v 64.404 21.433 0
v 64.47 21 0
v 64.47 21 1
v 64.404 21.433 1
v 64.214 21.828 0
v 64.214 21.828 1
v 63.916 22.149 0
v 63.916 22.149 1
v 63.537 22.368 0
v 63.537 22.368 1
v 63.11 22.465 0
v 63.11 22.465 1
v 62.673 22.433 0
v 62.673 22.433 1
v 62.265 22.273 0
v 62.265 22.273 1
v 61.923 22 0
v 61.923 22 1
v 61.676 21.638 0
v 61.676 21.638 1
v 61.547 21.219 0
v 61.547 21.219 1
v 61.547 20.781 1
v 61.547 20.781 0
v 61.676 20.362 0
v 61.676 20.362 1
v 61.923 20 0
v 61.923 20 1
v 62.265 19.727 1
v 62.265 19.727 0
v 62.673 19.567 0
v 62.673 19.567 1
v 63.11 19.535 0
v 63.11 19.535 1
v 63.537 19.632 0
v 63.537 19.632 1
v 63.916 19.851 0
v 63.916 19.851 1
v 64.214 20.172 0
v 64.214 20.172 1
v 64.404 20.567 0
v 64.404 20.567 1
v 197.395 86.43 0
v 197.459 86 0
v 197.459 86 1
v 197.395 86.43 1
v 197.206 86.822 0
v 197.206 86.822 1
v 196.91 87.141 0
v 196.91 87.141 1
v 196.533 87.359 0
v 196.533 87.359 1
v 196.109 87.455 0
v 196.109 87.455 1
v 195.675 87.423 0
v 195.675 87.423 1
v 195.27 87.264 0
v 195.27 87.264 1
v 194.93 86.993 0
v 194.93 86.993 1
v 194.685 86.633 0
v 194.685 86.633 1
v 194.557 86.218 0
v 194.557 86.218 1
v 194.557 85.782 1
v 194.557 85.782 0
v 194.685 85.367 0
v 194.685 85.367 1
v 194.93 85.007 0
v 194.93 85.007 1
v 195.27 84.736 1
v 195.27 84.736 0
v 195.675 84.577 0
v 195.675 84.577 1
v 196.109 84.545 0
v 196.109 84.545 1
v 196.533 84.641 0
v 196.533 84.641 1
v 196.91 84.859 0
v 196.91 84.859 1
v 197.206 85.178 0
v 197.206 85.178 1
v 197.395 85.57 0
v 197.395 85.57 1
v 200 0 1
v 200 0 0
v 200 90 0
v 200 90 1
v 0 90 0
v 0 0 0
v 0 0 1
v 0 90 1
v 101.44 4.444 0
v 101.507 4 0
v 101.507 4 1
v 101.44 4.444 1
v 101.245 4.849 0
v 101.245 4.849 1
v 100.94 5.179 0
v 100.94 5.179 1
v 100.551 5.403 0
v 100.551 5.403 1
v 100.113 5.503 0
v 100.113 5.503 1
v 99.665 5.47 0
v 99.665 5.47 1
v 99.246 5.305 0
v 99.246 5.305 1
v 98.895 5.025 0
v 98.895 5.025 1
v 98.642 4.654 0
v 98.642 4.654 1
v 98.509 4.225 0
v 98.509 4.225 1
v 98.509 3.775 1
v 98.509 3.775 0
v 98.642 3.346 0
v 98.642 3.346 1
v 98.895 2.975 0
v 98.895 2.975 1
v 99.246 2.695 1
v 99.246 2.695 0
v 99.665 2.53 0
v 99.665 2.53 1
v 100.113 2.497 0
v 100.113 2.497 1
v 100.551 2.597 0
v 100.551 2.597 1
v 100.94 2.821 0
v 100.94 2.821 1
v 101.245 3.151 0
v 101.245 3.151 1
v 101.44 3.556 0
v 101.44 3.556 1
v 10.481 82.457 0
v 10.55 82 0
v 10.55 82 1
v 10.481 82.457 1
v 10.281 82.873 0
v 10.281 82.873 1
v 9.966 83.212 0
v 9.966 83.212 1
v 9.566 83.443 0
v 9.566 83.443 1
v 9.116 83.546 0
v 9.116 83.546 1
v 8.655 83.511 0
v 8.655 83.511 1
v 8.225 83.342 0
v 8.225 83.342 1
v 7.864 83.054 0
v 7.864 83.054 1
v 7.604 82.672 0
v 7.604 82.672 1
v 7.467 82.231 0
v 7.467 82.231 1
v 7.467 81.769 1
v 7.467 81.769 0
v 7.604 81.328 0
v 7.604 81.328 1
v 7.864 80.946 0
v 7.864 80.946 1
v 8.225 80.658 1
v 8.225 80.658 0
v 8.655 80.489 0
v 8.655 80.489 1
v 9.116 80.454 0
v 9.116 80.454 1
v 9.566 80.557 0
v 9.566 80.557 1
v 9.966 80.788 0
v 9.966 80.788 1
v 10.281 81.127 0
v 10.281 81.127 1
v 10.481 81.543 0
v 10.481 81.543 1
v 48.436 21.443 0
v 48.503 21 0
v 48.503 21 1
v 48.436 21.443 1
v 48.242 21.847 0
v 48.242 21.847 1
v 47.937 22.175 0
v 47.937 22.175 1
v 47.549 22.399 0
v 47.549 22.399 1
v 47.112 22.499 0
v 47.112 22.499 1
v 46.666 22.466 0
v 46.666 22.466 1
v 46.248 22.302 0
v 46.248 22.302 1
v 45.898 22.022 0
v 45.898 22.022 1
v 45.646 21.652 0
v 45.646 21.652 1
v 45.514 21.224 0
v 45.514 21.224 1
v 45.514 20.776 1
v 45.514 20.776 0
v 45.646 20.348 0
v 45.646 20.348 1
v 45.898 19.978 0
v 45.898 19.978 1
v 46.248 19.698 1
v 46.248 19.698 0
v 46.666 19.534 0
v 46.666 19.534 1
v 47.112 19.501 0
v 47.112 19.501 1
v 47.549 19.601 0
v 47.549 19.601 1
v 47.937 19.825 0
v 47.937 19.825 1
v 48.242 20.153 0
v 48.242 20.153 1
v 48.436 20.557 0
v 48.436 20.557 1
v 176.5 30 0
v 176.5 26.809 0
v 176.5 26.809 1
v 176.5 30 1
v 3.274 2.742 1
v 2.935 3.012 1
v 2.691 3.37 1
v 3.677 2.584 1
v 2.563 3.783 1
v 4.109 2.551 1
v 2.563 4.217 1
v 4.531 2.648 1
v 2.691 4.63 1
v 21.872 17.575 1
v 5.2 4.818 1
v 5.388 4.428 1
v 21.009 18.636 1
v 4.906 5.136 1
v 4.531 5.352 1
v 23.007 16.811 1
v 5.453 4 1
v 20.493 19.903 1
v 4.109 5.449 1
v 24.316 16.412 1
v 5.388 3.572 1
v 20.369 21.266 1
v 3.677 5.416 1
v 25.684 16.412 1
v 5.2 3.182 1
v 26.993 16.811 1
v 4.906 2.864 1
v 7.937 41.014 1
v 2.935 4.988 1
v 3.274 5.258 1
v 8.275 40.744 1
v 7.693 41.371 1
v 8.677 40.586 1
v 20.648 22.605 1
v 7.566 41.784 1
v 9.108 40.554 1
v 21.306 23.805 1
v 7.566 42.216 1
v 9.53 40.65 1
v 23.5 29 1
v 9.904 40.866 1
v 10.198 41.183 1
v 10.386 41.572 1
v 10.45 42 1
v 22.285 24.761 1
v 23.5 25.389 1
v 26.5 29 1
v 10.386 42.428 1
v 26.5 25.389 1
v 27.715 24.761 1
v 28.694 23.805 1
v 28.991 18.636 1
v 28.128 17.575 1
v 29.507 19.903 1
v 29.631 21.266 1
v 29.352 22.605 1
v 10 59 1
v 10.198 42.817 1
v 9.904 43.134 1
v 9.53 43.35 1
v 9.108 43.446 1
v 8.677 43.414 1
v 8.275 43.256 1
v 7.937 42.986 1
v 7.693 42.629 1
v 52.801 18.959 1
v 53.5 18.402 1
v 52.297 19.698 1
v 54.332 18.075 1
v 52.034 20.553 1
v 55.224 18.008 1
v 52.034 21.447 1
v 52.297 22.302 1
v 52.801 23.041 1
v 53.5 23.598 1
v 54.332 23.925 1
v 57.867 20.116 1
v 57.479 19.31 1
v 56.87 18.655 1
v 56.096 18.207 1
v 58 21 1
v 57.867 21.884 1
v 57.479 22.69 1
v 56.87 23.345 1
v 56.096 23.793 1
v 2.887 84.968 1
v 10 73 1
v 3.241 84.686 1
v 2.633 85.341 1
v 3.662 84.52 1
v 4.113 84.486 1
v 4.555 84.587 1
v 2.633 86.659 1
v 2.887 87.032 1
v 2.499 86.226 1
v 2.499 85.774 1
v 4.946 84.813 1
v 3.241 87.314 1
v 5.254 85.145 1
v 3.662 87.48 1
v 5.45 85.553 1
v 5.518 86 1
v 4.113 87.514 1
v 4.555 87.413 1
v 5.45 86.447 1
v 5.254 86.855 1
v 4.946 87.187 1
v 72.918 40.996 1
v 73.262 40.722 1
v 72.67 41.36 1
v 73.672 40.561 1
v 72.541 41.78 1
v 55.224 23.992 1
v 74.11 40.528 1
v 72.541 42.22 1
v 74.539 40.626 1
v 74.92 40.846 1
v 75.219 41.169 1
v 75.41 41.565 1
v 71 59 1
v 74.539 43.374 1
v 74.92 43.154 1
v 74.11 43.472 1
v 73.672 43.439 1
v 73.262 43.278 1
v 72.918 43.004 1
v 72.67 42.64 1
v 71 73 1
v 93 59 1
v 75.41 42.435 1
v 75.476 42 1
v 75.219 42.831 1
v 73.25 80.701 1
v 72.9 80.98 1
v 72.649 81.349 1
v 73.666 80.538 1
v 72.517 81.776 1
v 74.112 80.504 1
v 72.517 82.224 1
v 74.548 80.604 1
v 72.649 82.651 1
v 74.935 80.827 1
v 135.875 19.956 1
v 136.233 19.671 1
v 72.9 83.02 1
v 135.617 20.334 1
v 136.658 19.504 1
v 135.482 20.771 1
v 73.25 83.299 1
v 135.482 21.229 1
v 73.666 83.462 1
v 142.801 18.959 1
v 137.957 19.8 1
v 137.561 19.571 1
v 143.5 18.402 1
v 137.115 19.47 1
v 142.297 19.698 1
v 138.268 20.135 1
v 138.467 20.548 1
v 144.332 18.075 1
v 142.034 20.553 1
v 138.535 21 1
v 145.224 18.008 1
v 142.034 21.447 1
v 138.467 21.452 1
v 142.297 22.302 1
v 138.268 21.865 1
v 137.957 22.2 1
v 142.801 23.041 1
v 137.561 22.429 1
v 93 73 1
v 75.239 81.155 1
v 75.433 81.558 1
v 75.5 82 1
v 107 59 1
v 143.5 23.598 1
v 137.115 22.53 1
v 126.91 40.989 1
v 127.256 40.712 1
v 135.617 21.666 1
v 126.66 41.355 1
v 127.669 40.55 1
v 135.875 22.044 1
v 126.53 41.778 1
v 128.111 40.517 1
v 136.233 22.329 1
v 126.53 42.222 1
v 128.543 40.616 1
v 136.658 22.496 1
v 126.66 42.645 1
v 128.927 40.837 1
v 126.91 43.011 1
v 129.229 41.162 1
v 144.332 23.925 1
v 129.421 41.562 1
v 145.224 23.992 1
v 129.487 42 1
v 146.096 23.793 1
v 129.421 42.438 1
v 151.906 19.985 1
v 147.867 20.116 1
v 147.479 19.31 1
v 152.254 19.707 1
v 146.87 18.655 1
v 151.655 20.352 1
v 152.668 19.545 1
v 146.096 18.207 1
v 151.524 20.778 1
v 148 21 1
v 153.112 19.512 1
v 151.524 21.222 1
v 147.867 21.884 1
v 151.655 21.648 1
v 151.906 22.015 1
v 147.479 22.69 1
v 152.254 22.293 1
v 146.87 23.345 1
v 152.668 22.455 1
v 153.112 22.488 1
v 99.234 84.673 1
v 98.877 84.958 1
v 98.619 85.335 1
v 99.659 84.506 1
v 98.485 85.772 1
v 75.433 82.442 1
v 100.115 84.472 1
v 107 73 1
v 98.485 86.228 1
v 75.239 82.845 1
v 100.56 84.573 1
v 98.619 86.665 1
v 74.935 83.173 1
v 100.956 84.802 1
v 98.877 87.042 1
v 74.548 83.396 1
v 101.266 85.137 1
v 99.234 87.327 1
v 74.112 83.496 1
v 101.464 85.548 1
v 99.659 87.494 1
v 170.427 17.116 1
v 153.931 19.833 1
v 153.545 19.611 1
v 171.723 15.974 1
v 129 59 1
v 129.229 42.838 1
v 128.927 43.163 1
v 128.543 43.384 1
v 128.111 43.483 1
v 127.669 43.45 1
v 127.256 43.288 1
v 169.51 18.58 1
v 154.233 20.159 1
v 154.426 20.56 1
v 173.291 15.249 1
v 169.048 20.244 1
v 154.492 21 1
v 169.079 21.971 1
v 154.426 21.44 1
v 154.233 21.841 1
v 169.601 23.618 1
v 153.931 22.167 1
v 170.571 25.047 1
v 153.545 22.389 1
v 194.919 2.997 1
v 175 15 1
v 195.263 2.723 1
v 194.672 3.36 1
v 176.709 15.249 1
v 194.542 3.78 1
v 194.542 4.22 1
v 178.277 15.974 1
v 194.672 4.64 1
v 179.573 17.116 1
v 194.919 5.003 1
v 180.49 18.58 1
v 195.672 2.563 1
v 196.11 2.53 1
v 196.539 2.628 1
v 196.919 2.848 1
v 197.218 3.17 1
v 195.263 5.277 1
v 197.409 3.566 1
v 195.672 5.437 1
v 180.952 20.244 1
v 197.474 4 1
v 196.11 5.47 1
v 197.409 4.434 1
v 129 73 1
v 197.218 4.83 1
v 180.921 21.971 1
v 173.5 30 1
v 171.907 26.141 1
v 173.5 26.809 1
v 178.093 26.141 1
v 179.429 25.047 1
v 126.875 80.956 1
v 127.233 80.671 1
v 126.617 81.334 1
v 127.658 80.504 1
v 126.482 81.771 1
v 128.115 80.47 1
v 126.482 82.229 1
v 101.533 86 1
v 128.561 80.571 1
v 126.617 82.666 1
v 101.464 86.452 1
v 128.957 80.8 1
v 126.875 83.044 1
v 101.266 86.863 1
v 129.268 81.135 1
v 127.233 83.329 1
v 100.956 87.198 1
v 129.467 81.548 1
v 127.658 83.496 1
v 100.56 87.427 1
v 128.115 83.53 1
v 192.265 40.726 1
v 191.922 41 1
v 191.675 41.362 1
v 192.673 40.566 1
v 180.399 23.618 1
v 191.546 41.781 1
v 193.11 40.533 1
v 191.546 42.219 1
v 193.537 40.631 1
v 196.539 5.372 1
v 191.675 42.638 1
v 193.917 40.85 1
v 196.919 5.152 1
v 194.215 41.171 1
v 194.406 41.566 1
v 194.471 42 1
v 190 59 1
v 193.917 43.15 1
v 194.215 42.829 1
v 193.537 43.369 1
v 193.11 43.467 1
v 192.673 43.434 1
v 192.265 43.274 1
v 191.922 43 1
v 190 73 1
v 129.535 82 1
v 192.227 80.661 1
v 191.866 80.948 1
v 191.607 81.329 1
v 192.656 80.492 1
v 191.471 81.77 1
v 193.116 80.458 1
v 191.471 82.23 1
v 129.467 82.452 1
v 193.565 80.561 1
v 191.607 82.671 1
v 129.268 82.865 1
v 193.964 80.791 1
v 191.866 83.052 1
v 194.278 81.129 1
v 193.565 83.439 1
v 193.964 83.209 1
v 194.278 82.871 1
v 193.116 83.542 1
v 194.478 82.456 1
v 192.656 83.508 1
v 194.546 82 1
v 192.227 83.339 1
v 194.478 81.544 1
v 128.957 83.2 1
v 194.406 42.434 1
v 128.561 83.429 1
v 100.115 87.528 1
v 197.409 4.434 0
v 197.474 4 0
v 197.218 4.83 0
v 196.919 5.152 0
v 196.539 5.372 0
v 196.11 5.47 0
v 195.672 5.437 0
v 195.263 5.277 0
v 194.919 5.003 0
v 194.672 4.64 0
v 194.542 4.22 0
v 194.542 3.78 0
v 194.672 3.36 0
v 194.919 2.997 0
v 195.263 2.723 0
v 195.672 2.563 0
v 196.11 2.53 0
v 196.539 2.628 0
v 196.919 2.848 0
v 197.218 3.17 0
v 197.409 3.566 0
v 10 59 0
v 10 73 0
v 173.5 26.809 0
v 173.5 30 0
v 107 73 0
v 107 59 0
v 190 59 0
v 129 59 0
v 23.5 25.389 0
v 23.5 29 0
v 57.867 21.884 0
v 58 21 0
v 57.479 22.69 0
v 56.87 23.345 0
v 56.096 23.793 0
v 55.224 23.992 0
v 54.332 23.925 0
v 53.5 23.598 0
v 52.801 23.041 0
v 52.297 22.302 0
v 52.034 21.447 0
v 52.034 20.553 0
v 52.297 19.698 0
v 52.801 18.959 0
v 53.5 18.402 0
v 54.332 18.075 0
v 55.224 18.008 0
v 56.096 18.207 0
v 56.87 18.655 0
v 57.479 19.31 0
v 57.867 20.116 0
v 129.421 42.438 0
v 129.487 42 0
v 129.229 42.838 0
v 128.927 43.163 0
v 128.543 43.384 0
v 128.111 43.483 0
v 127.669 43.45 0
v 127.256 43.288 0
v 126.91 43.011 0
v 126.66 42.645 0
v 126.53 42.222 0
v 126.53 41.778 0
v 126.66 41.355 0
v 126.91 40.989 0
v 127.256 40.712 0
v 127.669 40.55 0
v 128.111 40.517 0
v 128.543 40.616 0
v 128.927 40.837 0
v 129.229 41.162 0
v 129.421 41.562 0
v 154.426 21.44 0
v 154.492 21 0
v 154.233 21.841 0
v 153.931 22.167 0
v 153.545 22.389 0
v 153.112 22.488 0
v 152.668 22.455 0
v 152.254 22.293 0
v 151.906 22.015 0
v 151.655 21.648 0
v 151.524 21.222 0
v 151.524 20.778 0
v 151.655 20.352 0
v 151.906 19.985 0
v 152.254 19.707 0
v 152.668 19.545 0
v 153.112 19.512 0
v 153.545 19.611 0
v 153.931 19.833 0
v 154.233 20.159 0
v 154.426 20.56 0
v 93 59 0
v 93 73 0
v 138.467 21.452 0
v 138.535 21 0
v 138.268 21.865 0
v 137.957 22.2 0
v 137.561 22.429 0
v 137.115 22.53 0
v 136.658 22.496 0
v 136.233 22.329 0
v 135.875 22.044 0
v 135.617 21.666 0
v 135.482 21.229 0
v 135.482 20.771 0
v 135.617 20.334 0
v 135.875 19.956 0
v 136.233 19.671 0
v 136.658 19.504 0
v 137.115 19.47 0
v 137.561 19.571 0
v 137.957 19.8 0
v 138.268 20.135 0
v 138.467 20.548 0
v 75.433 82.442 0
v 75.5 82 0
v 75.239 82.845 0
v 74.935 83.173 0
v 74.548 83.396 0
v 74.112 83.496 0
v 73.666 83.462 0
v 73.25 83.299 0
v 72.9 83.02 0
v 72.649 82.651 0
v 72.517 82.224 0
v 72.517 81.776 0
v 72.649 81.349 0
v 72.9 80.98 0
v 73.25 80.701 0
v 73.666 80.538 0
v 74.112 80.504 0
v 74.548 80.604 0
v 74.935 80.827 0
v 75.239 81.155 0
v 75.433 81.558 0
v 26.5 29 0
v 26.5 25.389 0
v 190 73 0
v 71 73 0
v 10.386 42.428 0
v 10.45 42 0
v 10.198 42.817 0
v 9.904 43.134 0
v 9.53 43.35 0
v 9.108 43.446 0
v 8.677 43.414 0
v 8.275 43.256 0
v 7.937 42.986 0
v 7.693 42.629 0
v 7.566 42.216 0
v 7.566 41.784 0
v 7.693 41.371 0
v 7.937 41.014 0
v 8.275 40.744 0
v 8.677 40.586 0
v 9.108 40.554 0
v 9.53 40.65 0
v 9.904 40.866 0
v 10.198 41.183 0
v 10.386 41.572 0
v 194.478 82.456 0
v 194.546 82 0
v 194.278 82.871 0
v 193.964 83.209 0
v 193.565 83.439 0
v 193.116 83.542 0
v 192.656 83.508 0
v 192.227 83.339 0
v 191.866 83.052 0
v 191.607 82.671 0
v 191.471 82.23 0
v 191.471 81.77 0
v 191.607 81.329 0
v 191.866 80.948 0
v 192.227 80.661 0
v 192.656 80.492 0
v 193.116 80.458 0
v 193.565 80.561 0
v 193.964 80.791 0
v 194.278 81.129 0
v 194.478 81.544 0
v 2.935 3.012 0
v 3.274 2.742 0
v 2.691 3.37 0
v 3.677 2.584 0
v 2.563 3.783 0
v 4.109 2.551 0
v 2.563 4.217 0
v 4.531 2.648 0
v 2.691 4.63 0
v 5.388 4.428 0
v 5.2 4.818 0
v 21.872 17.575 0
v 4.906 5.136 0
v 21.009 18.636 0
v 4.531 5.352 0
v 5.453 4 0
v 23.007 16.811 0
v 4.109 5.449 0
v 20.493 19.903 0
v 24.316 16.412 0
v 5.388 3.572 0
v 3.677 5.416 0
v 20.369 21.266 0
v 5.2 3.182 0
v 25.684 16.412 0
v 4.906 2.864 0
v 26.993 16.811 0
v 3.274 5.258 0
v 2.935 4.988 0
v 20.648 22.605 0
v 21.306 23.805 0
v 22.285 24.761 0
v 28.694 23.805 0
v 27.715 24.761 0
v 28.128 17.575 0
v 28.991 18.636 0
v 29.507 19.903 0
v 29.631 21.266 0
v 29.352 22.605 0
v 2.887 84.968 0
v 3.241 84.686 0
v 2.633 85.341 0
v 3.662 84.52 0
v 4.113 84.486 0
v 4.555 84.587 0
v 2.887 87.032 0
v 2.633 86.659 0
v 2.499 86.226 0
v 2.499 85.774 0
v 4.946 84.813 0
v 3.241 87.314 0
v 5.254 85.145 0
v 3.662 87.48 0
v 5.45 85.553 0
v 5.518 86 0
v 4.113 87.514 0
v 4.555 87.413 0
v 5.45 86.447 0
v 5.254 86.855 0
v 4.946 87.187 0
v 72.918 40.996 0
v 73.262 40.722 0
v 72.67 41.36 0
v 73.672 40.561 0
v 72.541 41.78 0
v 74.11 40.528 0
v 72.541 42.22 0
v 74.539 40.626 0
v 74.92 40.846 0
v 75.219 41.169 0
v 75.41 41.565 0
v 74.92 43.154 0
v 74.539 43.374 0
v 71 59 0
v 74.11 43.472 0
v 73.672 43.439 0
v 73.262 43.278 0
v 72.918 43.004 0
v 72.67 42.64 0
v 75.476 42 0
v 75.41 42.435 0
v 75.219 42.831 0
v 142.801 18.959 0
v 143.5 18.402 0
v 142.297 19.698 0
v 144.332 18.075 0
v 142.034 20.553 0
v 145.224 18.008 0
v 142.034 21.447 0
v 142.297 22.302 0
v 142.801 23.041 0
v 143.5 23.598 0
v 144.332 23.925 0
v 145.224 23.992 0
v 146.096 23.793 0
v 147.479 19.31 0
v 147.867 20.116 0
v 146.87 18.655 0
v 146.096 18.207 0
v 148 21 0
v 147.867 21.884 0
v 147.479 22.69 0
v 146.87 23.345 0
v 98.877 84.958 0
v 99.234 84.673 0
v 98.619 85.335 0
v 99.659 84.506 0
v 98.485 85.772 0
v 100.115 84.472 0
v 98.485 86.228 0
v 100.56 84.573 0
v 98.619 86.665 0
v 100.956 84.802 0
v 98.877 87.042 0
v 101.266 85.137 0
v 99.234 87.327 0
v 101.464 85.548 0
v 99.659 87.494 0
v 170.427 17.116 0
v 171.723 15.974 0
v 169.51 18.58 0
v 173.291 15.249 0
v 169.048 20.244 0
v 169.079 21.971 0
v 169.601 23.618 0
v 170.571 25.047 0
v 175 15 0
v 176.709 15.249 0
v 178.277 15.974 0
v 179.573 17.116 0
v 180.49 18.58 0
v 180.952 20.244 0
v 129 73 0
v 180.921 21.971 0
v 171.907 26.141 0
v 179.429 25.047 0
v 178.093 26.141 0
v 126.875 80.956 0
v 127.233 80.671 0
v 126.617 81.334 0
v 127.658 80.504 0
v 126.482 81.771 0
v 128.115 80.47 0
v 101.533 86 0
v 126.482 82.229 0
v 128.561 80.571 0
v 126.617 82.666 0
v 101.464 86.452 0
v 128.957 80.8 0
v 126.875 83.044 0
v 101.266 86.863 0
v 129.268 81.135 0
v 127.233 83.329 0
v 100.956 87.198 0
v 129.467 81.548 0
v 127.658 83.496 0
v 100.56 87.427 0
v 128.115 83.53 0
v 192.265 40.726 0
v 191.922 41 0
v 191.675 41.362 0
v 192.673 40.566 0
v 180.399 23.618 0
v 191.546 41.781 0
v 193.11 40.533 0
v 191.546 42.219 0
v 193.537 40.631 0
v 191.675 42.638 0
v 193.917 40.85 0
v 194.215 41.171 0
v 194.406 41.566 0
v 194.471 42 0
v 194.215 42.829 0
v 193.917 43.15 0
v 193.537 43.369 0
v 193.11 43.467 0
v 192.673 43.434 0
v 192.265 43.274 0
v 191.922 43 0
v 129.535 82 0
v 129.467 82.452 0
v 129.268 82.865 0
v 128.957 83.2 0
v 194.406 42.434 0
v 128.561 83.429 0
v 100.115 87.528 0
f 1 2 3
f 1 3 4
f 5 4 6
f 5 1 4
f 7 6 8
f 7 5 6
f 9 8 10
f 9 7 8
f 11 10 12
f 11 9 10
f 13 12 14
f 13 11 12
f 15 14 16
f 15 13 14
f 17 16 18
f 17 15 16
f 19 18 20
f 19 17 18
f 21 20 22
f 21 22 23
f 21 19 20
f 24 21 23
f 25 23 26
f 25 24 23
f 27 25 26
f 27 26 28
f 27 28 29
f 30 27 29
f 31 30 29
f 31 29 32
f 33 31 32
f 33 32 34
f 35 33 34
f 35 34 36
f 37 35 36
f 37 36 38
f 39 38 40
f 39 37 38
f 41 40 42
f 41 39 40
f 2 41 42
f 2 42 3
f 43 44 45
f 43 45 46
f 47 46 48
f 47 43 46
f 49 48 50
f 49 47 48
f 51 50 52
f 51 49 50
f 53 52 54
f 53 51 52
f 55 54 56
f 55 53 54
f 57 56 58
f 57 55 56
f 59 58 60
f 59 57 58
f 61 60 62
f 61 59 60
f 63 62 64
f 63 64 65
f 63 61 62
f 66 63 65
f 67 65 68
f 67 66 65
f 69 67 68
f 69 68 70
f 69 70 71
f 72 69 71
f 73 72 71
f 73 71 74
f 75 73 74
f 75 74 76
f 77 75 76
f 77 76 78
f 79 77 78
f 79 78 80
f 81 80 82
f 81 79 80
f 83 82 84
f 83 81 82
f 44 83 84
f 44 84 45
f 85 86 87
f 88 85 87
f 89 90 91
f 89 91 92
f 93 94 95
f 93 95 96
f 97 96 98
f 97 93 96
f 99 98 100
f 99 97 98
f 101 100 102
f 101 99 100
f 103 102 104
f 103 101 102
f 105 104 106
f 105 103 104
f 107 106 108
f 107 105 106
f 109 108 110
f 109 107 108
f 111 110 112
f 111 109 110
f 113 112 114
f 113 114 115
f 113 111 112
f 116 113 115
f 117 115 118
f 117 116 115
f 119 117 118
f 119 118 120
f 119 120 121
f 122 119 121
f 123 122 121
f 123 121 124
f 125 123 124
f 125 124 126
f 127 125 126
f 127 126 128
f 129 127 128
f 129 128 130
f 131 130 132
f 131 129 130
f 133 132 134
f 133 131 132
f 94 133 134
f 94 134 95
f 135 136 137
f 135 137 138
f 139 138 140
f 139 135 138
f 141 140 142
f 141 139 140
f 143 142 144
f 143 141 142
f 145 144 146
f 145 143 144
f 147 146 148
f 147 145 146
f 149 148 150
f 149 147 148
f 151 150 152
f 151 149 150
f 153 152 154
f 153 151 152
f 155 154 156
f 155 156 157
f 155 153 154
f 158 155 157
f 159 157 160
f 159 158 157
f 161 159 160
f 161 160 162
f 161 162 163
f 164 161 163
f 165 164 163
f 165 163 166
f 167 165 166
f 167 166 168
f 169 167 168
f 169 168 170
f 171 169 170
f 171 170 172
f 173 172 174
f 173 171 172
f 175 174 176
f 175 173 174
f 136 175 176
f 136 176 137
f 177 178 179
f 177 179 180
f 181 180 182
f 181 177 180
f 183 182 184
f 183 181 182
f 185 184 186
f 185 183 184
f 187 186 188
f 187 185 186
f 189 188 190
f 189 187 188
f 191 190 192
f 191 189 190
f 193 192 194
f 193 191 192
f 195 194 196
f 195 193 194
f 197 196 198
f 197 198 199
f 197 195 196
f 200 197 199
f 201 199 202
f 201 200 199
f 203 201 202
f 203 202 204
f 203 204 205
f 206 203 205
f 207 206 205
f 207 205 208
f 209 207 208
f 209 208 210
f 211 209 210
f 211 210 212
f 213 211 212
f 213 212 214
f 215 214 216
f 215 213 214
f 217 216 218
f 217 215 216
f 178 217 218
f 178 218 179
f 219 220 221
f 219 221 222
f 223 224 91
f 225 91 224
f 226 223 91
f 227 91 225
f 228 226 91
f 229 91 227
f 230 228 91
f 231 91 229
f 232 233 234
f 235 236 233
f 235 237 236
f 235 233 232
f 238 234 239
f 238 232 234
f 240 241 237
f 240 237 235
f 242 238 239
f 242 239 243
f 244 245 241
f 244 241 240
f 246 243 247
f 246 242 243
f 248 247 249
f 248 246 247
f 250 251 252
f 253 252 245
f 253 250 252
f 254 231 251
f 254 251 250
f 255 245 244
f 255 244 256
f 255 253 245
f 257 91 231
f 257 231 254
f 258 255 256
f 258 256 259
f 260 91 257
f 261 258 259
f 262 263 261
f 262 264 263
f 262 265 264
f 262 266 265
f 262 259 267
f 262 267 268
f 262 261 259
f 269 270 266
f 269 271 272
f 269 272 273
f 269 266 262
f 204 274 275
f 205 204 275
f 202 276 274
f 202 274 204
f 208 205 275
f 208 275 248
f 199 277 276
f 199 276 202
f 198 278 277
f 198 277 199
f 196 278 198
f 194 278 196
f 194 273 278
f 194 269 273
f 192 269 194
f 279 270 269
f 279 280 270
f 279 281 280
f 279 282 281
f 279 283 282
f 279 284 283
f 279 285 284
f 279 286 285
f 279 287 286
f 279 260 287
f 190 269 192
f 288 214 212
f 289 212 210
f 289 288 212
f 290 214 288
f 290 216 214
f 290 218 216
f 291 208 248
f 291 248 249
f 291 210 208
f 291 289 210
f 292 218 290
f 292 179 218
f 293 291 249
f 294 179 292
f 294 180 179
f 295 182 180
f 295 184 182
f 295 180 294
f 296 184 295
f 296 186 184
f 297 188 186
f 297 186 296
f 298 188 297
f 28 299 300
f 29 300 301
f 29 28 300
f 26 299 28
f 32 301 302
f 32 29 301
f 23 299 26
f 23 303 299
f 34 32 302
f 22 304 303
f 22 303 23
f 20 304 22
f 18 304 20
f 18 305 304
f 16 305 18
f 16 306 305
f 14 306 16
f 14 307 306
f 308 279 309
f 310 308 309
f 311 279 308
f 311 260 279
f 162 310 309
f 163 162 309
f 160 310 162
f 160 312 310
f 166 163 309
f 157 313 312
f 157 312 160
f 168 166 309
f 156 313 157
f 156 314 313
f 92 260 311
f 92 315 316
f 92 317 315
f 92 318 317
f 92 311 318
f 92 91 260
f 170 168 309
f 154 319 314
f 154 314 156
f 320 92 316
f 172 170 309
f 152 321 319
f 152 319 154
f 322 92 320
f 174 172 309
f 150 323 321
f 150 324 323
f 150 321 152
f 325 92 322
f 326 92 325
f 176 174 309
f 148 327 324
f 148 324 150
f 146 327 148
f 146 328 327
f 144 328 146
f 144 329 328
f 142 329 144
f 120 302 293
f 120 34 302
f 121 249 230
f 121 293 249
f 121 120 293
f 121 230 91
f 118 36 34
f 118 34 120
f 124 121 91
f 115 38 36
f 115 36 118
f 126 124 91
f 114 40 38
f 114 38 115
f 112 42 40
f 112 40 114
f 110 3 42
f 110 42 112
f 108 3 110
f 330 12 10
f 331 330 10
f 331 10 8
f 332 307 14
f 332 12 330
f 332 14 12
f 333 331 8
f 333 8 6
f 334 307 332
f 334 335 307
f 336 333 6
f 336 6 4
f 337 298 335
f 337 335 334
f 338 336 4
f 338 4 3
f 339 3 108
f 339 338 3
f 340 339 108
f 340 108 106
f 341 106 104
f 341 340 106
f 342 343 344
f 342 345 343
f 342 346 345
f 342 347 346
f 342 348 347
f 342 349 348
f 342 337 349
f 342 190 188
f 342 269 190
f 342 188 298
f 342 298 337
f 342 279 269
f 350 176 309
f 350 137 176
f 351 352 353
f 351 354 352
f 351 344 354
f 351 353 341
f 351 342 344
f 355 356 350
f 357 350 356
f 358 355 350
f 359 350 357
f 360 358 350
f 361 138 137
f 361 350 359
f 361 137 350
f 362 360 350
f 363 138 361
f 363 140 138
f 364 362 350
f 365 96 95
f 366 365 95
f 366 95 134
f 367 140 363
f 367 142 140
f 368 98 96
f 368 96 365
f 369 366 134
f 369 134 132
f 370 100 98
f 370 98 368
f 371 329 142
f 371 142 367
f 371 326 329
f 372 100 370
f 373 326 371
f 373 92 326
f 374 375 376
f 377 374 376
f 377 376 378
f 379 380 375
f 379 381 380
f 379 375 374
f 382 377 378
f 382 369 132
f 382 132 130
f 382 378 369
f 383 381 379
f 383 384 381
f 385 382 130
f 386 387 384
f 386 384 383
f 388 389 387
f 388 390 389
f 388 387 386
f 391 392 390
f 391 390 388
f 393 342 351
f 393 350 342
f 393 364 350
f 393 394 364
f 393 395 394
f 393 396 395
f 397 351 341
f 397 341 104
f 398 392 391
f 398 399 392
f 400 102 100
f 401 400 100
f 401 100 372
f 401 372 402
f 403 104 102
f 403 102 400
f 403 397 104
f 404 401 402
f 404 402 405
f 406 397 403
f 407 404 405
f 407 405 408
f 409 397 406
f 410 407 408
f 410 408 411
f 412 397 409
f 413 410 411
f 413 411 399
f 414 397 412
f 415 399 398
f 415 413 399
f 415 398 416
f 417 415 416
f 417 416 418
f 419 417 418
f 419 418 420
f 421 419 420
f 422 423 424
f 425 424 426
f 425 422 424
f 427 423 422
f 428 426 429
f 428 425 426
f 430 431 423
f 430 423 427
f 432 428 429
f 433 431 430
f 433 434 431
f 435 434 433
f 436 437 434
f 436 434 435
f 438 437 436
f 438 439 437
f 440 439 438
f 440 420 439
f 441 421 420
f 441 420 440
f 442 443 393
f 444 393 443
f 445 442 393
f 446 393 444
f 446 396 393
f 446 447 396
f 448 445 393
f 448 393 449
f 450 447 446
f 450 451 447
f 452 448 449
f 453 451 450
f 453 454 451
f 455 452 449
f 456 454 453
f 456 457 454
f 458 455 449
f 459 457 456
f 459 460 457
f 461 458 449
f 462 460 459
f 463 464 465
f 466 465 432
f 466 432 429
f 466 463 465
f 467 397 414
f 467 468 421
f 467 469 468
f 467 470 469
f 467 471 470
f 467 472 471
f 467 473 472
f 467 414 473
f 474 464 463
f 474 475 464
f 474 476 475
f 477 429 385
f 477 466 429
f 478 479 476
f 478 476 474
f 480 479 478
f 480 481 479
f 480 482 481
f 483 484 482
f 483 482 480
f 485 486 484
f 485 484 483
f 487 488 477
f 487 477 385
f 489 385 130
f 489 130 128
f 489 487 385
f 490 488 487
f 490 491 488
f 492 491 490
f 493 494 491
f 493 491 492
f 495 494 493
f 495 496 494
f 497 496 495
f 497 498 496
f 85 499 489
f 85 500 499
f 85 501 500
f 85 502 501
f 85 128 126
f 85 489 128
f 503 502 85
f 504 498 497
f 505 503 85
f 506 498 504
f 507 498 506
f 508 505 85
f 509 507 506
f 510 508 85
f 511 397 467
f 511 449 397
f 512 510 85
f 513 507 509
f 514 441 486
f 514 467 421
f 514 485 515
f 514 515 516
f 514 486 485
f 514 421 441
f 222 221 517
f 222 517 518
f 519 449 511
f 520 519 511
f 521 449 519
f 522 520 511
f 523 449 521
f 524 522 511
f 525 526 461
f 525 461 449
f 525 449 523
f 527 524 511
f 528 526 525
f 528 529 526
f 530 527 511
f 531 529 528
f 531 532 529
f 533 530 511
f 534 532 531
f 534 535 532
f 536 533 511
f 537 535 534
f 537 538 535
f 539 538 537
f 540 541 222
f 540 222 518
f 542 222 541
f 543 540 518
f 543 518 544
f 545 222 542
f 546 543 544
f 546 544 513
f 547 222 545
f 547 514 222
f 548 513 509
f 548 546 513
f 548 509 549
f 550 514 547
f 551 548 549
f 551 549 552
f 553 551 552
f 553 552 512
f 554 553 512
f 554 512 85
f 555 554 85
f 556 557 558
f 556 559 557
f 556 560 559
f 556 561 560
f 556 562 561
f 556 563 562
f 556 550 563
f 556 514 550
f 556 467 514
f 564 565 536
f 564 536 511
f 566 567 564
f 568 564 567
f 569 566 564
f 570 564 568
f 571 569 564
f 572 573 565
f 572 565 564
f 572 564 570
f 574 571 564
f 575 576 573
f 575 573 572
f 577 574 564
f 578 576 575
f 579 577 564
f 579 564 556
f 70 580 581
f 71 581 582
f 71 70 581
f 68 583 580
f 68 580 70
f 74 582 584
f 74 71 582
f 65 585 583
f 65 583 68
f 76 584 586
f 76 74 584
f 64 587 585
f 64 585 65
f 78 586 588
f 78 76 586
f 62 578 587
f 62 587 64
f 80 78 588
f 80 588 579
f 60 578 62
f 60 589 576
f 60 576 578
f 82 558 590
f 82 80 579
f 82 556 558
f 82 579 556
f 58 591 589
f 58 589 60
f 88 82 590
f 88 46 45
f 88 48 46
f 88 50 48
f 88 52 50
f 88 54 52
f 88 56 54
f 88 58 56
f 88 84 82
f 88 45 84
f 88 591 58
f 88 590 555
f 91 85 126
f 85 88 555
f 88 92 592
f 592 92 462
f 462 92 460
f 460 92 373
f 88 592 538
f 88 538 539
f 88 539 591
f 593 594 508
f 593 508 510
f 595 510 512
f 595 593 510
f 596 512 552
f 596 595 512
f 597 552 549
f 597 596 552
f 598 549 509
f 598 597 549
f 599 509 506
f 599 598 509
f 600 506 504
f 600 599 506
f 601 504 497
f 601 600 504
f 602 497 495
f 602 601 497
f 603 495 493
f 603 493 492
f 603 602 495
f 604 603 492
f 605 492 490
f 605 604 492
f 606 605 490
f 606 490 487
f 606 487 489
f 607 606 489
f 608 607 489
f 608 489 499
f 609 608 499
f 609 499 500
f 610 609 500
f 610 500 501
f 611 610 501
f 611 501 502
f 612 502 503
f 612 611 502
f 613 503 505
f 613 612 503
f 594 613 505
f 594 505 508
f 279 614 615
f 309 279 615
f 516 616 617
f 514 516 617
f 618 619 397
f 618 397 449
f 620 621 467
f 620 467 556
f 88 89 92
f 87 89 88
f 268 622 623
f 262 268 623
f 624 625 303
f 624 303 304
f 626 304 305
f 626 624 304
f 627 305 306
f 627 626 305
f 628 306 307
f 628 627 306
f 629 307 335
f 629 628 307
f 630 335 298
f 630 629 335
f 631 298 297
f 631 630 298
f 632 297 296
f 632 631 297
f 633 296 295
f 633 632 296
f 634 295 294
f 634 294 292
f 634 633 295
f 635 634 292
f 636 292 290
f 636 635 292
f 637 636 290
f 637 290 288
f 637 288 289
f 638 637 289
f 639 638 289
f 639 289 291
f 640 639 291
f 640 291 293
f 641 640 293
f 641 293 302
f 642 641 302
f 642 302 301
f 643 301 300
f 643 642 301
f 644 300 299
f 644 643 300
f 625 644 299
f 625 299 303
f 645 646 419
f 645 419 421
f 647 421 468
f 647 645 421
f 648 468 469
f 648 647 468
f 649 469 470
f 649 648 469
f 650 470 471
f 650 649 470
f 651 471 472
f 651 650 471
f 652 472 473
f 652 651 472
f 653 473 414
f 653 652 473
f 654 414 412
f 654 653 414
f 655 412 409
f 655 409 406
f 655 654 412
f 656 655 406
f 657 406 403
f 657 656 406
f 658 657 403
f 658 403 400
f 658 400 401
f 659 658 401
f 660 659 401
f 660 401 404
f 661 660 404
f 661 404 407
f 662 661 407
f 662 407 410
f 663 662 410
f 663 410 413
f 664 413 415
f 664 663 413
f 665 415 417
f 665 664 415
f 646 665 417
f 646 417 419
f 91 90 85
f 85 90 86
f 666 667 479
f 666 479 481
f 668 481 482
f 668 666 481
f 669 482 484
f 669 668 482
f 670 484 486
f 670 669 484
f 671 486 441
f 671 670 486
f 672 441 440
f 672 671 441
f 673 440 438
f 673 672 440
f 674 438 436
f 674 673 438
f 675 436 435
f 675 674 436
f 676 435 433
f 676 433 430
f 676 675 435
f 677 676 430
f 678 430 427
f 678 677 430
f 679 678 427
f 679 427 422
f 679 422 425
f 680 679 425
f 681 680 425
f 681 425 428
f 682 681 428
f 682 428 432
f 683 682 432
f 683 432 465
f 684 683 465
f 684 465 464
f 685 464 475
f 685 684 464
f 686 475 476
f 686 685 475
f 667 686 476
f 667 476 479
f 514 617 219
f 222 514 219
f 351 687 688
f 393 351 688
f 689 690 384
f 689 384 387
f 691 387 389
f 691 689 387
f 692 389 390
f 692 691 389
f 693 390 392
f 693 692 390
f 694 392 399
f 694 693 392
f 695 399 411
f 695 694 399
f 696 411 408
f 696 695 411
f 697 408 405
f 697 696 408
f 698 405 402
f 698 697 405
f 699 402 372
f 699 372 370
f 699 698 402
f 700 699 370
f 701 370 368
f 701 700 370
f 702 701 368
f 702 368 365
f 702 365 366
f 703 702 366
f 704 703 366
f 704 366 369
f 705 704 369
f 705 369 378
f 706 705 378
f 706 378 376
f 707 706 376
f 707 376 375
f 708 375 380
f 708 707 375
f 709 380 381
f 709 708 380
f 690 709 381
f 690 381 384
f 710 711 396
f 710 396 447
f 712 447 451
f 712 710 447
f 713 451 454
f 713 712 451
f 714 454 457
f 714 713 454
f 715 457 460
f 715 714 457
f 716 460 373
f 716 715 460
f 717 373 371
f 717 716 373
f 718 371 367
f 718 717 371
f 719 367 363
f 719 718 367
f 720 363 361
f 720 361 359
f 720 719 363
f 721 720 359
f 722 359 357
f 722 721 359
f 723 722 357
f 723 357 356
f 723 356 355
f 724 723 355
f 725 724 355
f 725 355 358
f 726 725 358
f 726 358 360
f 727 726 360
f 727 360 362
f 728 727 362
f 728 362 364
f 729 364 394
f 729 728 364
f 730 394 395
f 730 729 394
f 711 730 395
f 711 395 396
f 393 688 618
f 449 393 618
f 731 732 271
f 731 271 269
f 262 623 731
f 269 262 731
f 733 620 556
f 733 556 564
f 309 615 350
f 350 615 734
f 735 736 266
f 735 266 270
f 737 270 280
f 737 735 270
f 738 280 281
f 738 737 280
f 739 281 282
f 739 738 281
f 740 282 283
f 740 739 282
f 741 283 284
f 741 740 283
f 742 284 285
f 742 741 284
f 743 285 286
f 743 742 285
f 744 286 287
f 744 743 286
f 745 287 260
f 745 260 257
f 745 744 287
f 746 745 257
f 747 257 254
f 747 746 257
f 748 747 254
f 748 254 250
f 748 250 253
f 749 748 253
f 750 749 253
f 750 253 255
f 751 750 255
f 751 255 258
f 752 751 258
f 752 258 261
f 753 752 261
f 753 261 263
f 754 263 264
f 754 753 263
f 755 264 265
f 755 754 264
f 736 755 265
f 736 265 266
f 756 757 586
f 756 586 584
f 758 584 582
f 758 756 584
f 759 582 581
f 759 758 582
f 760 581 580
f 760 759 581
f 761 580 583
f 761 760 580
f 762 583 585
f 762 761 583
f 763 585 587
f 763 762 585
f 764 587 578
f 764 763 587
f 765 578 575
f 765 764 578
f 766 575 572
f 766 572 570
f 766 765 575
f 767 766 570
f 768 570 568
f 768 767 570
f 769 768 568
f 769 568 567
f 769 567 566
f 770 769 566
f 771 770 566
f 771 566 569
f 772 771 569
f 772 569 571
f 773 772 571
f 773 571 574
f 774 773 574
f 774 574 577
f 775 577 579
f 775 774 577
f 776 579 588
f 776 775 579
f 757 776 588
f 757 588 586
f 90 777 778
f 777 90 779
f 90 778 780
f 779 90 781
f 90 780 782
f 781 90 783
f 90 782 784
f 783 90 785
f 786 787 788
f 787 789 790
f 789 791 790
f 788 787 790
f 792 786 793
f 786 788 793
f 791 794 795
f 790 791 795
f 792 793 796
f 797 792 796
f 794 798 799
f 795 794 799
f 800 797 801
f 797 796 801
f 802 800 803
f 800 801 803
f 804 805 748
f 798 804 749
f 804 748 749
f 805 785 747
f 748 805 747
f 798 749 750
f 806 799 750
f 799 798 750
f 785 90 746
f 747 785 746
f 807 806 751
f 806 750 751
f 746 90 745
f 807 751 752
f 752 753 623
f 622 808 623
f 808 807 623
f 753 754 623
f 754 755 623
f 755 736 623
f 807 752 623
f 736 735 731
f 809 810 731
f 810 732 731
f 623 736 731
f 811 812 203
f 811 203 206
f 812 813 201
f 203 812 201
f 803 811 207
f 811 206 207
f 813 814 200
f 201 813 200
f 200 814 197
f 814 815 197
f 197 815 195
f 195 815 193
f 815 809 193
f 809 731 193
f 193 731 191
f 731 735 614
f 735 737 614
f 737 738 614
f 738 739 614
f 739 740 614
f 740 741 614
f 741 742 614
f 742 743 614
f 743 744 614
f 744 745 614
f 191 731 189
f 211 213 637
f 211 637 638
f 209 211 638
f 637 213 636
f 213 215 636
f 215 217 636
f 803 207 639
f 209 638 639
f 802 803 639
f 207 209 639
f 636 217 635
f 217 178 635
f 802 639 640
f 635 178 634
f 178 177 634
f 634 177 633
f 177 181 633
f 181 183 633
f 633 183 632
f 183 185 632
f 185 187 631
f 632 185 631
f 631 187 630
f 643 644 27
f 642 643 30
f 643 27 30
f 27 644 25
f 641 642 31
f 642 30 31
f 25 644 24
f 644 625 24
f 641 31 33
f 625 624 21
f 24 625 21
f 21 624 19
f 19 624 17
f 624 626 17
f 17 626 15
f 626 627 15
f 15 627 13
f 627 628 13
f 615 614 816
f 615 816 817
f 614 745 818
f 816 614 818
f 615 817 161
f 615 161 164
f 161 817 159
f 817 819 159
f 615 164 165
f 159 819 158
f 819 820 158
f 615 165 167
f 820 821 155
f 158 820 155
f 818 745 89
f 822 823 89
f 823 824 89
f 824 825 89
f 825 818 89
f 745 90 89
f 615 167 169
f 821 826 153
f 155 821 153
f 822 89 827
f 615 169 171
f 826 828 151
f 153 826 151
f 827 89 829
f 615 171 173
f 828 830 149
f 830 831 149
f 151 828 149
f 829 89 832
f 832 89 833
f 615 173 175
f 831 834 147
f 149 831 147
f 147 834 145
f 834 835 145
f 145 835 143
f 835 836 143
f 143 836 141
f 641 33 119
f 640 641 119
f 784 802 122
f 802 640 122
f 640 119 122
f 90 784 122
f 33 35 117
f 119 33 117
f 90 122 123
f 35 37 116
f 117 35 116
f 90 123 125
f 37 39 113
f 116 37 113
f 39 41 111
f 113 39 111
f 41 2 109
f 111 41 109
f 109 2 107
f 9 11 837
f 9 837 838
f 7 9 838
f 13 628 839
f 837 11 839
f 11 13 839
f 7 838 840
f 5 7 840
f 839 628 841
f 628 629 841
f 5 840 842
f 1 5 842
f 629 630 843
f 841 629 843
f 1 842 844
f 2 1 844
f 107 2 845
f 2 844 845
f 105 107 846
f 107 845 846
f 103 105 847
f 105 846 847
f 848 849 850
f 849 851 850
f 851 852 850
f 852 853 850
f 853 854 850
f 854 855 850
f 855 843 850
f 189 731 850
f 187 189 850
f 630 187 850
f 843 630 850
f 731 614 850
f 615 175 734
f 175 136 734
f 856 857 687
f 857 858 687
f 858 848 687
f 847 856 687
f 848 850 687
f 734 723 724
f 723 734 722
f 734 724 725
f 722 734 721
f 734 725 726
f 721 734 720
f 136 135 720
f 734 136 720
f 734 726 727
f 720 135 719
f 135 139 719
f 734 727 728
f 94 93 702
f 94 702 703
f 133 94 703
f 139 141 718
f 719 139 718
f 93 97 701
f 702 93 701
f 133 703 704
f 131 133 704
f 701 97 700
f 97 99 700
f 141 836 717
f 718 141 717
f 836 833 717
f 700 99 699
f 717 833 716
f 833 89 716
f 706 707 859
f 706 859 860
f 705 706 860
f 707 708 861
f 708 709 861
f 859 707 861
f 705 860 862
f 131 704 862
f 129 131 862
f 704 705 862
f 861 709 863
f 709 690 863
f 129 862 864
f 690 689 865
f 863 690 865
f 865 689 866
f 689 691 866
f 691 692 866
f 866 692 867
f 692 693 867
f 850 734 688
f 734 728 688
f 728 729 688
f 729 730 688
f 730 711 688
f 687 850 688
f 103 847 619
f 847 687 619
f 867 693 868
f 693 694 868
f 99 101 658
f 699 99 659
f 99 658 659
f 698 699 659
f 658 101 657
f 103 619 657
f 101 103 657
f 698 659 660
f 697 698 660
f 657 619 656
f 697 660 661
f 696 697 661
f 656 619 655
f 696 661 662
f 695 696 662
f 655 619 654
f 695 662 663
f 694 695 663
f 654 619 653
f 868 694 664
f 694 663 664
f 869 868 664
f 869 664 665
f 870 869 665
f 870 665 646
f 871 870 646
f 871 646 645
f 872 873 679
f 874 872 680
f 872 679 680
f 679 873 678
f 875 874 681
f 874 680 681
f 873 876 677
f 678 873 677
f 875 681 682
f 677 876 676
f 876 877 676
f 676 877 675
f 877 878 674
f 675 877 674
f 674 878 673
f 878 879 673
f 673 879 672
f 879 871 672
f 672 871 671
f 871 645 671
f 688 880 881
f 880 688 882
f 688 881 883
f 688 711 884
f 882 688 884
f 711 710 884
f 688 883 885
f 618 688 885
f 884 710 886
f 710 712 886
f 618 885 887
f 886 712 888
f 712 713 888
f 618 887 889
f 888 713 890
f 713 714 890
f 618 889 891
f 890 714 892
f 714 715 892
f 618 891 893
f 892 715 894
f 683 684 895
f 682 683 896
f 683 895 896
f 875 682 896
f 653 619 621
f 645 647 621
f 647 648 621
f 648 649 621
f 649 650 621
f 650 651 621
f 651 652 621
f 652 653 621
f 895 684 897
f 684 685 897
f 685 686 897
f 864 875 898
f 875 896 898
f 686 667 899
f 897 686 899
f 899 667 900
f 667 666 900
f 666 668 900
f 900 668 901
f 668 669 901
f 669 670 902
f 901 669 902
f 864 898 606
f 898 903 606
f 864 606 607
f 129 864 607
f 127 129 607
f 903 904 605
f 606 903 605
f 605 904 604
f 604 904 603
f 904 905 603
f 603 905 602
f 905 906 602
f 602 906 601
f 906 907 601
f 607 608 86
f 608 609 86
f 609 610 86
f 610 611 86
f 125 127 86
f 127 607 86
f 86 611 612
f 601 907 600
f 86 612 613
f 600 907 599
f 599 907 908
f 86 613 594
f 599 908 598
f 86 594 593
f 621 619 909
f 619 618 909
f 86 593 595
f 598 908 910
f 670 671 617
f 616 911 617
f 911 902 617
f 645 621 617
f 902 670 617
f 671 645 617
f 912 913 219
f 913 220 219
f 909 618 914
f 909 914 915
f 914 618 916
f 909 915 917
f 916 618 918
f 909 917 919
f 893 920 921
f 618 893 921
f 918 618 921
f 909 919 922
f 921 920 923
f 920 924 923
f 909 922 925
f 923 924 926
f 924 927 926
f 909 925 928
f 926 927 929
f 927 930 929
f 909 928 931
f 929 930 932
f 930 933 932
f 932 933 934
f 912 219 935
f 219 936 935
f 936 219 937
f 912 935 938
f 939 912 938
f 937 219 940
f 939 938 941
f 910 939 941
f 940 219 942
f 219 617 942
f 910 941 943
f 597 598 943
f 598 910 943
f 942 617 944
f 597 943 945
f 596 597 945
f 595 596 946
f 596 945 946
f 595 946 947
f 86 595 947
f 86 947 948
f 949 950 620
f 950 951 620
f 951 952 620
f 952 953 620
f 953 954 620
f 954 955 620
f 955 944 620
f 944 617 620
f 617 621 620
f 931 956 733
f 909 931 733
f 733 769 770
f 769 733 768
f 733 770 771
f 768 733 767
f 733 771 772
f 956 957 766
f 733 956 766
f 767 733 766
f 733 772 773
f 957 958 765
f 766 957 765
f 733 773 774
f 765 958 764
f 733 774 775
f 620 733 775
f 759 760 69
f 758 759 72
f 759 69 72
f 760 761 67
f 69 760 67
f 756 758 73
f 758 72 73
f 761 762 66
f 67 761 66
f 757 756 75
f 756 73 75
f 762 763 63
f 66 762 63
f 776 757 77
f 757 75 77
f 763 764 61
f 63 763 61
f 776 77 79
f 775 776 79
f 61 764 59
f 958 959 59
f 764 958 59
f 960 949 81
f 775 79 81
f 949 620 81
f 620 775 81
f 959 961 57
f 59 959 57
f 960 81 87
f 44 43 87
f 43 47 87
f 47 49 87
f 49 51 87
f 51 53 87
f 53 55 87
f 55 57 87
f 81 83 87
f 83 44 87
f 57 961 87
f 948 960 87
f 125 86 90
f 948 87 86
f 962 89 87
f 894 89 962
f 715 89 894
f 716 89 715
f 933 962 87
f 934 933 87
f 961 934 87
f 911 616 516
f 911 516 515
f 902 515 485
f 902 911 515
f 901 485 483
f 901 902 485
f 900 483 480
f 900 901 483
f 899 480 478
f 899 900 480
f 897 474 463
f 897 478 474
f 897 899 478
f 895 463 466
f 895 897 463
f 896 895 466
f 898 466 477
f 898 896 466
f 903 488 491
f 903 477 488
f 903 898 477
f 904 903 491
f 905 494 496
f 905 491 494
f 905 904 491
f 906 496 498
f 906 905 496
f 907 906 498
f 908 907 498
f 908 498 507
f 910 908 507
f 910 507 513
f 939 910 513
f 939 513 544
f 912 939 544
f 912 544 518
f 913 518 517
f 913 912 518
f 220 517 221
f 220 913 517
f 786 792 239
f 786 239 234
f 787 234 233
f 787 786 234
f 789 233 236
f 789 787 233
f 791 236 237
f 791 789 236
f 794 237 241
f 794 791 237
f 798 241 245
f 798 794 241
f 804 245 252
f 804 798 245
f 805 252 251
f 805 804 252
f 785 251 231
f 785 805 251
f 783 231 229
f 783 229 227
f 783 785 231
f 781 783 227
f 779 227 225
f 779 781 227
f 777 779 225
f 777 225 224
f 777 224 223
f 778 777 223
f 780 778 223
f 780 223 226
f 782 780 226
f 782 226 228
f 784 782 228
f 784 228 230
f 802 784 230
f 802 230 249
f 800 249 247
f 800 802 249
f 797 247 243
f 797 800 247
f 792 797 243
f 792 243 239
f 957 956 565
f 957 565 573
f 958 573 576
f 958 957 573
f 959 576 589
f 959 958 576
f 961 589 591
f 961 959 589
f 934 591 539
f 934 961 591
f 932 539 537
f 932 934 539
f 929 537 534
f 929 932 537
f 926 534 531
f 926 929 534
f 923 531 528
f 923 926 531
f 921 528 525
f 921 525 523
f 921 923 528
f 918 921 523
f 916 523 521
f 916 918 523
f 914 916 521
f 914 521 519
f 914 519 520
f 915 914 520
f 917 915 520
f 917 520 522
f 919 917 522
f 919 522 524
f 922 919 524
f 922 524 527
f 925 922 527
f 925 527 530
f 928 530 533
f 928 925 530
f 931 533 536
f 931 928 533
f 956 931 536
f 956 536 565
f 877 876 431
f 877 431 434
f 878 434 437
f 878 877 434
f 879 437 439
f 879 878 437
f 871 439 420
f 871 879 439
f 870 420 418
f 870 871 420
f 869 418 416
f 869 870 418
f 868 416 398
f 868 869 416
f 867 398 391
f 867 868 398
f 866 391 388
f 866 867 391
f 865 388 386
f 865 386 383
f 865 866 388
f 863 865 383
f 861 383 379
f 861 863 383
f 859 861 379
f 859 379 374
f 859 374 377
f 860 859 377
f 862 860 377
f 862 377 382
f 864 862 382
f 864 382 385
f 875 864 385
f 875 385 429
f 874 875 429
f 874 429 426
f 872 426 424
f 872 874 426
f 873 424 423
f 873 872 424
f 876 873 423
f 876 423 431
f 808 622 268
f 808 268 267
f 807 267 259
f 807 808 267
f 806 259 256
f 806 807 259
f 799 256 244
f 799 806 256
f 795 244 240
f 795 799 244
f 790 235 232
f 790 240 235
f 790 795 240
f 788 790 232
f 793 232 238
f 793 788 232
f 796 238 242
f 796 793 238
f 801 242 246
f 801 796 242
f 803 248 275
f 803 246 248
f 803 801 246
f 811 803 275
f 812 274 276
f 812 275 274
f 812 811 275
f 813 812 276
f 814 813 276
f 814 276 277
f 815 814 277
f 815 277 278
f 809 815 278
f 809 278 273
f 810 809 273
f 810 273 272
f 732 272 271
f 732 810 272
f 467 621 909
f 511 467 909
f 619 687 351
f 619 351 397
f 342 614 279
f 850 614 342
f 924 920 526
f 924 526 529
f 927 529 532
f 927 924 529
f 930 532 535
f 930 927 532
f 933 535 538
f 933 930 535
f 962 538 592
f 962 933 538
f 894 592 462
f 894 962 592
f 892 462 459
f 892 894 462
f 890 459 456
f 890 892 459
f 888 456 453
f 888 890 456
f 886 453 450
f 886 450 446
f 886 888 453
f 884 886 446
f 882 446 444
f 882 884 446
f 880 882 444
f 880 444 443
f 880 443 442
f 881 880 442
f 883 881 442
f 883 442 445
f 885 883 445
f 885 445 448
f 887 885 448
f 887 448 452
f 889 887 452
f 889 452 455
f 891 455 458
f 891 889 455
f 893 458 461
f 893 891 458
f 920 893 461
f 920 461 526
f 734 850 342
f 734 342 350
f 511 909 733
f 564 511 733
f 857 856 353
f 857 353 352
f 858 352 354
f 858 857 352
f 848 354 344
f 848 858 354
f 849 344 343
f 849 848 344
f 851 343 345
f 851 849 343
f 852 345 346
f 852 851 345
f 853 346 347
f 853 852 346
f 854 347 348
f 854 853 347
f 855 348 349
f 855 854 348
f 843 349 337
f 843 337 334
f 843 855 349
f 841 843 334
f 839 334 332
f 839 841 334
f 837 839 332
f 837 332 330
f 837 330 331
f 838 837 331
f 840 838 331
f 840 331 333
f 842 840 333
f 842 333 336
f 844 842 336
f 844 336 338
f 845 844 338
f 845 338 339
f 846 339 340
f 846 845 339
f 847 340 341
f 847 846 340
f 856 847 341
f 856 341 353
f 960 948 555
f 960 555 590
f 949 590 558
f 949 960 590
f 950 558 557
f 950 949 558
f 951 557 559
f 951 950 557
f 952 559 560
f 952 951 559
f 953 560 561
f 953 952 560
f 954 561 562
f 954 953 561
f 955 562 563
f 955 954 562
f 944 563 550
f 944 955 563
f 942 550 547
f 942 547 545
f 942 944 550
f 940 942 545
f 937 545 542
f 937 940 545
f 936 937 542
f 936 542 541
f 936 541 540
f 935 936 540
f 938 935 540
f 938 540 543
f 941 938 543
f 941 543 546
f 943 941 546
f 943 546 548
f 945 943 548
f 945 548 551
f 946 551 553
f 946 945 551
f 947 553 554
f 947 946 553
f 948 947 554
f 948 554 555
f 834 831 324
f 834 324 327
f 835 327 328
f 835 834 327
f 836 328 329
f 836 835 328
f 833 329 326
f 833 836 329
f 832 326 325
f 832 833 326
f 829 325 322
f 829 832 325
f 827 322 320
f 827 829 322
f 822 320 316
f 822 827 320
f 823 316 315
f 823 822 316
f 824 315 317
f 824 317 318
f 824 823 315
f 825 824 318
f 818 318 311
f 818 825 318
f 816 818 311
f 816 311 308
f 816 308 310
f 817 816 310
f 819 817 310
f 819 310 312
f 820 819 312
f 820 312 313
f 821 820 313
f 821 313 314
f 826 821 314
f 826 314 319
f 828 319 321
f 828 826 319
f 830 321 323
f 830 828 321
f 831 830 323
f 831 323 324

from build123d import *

# Parameters (mm, degrees)
BOX001_W     = 3
BOX001_H     = 4
BOX001_DEPTH = 15
BOX_W        = 3
BOX_H        = 4
BOX_DEPTH    = 15
SKETCH_W     = 200
SKETCH_H     = 90
SKETCH_R     = 1.549855
SKETCH_R_2   = 1.534707
SKETCH_R_3   = 1.450363
SKETCH_R_4   = 1.487036
SKETCH_R_5   = 1.500003
SKETCH_R_6   = 1.546382
SKETCH_R_7   = 1.475806
SKETCH_R_8   = 1.470873
SKETCH_R_9   = 1.517779
SKETCH_R_10  = 1.459473
SKETCH_R_11  = 1.474048
SKETCH_R_12  = 1.452864
SKETCH_R_13  = 1.50738
SKETCH_R_14  = 1.532562
SKETCH_R_15  = 4.638624
SKETCH_R_16  = 3
SKETCH_R_17  = 1.469531
SKETCH_R_18  = 1.503215
SKETCH_R_19  = 1.49249
SKETCH_R_20  = 1.53474
SKETCH_R_21  = 6
SKETCH_W_2   = 61
SKETCH_H_2   = 14
SKETCH_W_3   = 14
PAD_DEPTH    = 1


with BuildPart() as cube001:
    # Box001 → Box001 (new body)
    with BuildSketch(Plane(origin=(173.5, 26, -7), x_dir=(1, 0, 0), z_dir=(0, 0, 1))):
        with Locations((1.5, 2)):
            Rectangle(BOX001_W, BOX001_H)
    extrude(amount=BOX001_DEPTH)


with BuildPart() as cube:
    # Box → Box (new body)
    with BuildSketch(Plane(origin=(23.5, 25, -7), x_dir=(1, 0, 0), z_dir=(0, 0, 1))):
        with Locations((1.5, 2)):
            Rectangle(BOX_W, BOX_H)
    extrude(amount=BOX_DEPTH)


with BuildPart() as cut001:
    # Sketch → Pad (new body)
    with BuildSketch(Plane.XY):
        with Locations((100, 45)):
            Rectangle(SKETCH_W, SKETCH_H)
        with Locations((9, 82)):
            Circle(SKETCH_R, mode=Mode.SUBTRACT)
        with Locations((128, 82)):
            Circle(SKETCH_R_2, mode=Mode.SUBTRACT)
        with Locations((9, 42)):
            Circle(SKETCH_R_3, mode=Mode.SUBTRACT)
        with Locations((128, 42)):
            Circle(SKETCH_R_4, mode=Mode.SUBTRACT)
        with Locations((74, 82)):
            Circle(SKETCH_R_5, mode=Mode.SUBTRACT)
        with Locations((193, 82)):
            Circle(SKETCH_R_6, mode=Mode.SUBTRACT)
        with Locations((74, 42)):
            Circle(SKETCH_R_7, mode=Mode.SUBTRACT)
        with Locations((193, 42)):
            Circle(SKETCH_R_8, mode=Mode.SUBTRACT)
        with Locations((4, 86)):
            Circle(SKETCH_R_9, mode=Mode.SUBTRACT)
        with Locations((196, 86)):
            Circle(SKETCH_R_10, mode=Mode.SUBTRACT)
        with Locations((196, 4)):
            Circle(SKETCH_R_11, mode=Mode.SUBTRACT)
        with Locations((4, 4)):
            Circle(SKETCH_R_12, mode=Mode.SUBTRACT)
        with Locations((100, 4)):
            Circle(SKETCH_R_13, mode=Mode.SUBTRACT)
        with Locations((100, 86)):
            Circle(SKETCH_R_14, mode=Mode.SUBTRACT)
        with Locations((25, 21)):
            Circle(SKETCH_R_15, mode=Mode.SUBTRACT)
        with Locations((55, 21)):
            Circle(SKETCH_R_16, mode=Mode.SUBTRACT)
        with Locations((63, 21)):
            Circle(SKETCH_R_17, mode=Mode.SUBTRACT)
        with Locations((47, 21)):
            Circle(SKETCH_R_18, mode=Mode.SUBTRACT)
        with Locations((145, 21)):
            Circle(SKETCH_R_16, mode=Mode.SUBTRACT)
        with Locations((153, 21)):
            Circle(SKETCH_R_19, mode=Mode.SUBTRACT)
        with Locations((137, 21)):
            Circle(SKETCH_R_20, mode=Mode.SUBTRACT)
        with Locations((175, 21)):
            Circle(SKETCH_R_21, mode=Mode.SUBTRACT)
        with Locations((40.5, 66)):
            Rectangle(SKETCH_W_2, SKETCH_H_2, mode=Mode.SUBTRACT)
        with Locations((100, 66)):
            Rectangle(SKETCH_W_3, SKETCH_H_2, mode=Mode.SUBTRACT)
        with Locations((159.5, 66)):
            Rectangle(SKETCH_W_2, SKETCH_H_2, mode=Mode.SUBTRACT)
    extrude(amount=PAD_DEPTH)

    # Cut: cut Cube
    add(cube.part, mode=Mode.SUBTRACT)

    # Cut001: cut Cube001
    add(cube001.part, mode=Mode.SUBTRACT)


solid = cut001.part
